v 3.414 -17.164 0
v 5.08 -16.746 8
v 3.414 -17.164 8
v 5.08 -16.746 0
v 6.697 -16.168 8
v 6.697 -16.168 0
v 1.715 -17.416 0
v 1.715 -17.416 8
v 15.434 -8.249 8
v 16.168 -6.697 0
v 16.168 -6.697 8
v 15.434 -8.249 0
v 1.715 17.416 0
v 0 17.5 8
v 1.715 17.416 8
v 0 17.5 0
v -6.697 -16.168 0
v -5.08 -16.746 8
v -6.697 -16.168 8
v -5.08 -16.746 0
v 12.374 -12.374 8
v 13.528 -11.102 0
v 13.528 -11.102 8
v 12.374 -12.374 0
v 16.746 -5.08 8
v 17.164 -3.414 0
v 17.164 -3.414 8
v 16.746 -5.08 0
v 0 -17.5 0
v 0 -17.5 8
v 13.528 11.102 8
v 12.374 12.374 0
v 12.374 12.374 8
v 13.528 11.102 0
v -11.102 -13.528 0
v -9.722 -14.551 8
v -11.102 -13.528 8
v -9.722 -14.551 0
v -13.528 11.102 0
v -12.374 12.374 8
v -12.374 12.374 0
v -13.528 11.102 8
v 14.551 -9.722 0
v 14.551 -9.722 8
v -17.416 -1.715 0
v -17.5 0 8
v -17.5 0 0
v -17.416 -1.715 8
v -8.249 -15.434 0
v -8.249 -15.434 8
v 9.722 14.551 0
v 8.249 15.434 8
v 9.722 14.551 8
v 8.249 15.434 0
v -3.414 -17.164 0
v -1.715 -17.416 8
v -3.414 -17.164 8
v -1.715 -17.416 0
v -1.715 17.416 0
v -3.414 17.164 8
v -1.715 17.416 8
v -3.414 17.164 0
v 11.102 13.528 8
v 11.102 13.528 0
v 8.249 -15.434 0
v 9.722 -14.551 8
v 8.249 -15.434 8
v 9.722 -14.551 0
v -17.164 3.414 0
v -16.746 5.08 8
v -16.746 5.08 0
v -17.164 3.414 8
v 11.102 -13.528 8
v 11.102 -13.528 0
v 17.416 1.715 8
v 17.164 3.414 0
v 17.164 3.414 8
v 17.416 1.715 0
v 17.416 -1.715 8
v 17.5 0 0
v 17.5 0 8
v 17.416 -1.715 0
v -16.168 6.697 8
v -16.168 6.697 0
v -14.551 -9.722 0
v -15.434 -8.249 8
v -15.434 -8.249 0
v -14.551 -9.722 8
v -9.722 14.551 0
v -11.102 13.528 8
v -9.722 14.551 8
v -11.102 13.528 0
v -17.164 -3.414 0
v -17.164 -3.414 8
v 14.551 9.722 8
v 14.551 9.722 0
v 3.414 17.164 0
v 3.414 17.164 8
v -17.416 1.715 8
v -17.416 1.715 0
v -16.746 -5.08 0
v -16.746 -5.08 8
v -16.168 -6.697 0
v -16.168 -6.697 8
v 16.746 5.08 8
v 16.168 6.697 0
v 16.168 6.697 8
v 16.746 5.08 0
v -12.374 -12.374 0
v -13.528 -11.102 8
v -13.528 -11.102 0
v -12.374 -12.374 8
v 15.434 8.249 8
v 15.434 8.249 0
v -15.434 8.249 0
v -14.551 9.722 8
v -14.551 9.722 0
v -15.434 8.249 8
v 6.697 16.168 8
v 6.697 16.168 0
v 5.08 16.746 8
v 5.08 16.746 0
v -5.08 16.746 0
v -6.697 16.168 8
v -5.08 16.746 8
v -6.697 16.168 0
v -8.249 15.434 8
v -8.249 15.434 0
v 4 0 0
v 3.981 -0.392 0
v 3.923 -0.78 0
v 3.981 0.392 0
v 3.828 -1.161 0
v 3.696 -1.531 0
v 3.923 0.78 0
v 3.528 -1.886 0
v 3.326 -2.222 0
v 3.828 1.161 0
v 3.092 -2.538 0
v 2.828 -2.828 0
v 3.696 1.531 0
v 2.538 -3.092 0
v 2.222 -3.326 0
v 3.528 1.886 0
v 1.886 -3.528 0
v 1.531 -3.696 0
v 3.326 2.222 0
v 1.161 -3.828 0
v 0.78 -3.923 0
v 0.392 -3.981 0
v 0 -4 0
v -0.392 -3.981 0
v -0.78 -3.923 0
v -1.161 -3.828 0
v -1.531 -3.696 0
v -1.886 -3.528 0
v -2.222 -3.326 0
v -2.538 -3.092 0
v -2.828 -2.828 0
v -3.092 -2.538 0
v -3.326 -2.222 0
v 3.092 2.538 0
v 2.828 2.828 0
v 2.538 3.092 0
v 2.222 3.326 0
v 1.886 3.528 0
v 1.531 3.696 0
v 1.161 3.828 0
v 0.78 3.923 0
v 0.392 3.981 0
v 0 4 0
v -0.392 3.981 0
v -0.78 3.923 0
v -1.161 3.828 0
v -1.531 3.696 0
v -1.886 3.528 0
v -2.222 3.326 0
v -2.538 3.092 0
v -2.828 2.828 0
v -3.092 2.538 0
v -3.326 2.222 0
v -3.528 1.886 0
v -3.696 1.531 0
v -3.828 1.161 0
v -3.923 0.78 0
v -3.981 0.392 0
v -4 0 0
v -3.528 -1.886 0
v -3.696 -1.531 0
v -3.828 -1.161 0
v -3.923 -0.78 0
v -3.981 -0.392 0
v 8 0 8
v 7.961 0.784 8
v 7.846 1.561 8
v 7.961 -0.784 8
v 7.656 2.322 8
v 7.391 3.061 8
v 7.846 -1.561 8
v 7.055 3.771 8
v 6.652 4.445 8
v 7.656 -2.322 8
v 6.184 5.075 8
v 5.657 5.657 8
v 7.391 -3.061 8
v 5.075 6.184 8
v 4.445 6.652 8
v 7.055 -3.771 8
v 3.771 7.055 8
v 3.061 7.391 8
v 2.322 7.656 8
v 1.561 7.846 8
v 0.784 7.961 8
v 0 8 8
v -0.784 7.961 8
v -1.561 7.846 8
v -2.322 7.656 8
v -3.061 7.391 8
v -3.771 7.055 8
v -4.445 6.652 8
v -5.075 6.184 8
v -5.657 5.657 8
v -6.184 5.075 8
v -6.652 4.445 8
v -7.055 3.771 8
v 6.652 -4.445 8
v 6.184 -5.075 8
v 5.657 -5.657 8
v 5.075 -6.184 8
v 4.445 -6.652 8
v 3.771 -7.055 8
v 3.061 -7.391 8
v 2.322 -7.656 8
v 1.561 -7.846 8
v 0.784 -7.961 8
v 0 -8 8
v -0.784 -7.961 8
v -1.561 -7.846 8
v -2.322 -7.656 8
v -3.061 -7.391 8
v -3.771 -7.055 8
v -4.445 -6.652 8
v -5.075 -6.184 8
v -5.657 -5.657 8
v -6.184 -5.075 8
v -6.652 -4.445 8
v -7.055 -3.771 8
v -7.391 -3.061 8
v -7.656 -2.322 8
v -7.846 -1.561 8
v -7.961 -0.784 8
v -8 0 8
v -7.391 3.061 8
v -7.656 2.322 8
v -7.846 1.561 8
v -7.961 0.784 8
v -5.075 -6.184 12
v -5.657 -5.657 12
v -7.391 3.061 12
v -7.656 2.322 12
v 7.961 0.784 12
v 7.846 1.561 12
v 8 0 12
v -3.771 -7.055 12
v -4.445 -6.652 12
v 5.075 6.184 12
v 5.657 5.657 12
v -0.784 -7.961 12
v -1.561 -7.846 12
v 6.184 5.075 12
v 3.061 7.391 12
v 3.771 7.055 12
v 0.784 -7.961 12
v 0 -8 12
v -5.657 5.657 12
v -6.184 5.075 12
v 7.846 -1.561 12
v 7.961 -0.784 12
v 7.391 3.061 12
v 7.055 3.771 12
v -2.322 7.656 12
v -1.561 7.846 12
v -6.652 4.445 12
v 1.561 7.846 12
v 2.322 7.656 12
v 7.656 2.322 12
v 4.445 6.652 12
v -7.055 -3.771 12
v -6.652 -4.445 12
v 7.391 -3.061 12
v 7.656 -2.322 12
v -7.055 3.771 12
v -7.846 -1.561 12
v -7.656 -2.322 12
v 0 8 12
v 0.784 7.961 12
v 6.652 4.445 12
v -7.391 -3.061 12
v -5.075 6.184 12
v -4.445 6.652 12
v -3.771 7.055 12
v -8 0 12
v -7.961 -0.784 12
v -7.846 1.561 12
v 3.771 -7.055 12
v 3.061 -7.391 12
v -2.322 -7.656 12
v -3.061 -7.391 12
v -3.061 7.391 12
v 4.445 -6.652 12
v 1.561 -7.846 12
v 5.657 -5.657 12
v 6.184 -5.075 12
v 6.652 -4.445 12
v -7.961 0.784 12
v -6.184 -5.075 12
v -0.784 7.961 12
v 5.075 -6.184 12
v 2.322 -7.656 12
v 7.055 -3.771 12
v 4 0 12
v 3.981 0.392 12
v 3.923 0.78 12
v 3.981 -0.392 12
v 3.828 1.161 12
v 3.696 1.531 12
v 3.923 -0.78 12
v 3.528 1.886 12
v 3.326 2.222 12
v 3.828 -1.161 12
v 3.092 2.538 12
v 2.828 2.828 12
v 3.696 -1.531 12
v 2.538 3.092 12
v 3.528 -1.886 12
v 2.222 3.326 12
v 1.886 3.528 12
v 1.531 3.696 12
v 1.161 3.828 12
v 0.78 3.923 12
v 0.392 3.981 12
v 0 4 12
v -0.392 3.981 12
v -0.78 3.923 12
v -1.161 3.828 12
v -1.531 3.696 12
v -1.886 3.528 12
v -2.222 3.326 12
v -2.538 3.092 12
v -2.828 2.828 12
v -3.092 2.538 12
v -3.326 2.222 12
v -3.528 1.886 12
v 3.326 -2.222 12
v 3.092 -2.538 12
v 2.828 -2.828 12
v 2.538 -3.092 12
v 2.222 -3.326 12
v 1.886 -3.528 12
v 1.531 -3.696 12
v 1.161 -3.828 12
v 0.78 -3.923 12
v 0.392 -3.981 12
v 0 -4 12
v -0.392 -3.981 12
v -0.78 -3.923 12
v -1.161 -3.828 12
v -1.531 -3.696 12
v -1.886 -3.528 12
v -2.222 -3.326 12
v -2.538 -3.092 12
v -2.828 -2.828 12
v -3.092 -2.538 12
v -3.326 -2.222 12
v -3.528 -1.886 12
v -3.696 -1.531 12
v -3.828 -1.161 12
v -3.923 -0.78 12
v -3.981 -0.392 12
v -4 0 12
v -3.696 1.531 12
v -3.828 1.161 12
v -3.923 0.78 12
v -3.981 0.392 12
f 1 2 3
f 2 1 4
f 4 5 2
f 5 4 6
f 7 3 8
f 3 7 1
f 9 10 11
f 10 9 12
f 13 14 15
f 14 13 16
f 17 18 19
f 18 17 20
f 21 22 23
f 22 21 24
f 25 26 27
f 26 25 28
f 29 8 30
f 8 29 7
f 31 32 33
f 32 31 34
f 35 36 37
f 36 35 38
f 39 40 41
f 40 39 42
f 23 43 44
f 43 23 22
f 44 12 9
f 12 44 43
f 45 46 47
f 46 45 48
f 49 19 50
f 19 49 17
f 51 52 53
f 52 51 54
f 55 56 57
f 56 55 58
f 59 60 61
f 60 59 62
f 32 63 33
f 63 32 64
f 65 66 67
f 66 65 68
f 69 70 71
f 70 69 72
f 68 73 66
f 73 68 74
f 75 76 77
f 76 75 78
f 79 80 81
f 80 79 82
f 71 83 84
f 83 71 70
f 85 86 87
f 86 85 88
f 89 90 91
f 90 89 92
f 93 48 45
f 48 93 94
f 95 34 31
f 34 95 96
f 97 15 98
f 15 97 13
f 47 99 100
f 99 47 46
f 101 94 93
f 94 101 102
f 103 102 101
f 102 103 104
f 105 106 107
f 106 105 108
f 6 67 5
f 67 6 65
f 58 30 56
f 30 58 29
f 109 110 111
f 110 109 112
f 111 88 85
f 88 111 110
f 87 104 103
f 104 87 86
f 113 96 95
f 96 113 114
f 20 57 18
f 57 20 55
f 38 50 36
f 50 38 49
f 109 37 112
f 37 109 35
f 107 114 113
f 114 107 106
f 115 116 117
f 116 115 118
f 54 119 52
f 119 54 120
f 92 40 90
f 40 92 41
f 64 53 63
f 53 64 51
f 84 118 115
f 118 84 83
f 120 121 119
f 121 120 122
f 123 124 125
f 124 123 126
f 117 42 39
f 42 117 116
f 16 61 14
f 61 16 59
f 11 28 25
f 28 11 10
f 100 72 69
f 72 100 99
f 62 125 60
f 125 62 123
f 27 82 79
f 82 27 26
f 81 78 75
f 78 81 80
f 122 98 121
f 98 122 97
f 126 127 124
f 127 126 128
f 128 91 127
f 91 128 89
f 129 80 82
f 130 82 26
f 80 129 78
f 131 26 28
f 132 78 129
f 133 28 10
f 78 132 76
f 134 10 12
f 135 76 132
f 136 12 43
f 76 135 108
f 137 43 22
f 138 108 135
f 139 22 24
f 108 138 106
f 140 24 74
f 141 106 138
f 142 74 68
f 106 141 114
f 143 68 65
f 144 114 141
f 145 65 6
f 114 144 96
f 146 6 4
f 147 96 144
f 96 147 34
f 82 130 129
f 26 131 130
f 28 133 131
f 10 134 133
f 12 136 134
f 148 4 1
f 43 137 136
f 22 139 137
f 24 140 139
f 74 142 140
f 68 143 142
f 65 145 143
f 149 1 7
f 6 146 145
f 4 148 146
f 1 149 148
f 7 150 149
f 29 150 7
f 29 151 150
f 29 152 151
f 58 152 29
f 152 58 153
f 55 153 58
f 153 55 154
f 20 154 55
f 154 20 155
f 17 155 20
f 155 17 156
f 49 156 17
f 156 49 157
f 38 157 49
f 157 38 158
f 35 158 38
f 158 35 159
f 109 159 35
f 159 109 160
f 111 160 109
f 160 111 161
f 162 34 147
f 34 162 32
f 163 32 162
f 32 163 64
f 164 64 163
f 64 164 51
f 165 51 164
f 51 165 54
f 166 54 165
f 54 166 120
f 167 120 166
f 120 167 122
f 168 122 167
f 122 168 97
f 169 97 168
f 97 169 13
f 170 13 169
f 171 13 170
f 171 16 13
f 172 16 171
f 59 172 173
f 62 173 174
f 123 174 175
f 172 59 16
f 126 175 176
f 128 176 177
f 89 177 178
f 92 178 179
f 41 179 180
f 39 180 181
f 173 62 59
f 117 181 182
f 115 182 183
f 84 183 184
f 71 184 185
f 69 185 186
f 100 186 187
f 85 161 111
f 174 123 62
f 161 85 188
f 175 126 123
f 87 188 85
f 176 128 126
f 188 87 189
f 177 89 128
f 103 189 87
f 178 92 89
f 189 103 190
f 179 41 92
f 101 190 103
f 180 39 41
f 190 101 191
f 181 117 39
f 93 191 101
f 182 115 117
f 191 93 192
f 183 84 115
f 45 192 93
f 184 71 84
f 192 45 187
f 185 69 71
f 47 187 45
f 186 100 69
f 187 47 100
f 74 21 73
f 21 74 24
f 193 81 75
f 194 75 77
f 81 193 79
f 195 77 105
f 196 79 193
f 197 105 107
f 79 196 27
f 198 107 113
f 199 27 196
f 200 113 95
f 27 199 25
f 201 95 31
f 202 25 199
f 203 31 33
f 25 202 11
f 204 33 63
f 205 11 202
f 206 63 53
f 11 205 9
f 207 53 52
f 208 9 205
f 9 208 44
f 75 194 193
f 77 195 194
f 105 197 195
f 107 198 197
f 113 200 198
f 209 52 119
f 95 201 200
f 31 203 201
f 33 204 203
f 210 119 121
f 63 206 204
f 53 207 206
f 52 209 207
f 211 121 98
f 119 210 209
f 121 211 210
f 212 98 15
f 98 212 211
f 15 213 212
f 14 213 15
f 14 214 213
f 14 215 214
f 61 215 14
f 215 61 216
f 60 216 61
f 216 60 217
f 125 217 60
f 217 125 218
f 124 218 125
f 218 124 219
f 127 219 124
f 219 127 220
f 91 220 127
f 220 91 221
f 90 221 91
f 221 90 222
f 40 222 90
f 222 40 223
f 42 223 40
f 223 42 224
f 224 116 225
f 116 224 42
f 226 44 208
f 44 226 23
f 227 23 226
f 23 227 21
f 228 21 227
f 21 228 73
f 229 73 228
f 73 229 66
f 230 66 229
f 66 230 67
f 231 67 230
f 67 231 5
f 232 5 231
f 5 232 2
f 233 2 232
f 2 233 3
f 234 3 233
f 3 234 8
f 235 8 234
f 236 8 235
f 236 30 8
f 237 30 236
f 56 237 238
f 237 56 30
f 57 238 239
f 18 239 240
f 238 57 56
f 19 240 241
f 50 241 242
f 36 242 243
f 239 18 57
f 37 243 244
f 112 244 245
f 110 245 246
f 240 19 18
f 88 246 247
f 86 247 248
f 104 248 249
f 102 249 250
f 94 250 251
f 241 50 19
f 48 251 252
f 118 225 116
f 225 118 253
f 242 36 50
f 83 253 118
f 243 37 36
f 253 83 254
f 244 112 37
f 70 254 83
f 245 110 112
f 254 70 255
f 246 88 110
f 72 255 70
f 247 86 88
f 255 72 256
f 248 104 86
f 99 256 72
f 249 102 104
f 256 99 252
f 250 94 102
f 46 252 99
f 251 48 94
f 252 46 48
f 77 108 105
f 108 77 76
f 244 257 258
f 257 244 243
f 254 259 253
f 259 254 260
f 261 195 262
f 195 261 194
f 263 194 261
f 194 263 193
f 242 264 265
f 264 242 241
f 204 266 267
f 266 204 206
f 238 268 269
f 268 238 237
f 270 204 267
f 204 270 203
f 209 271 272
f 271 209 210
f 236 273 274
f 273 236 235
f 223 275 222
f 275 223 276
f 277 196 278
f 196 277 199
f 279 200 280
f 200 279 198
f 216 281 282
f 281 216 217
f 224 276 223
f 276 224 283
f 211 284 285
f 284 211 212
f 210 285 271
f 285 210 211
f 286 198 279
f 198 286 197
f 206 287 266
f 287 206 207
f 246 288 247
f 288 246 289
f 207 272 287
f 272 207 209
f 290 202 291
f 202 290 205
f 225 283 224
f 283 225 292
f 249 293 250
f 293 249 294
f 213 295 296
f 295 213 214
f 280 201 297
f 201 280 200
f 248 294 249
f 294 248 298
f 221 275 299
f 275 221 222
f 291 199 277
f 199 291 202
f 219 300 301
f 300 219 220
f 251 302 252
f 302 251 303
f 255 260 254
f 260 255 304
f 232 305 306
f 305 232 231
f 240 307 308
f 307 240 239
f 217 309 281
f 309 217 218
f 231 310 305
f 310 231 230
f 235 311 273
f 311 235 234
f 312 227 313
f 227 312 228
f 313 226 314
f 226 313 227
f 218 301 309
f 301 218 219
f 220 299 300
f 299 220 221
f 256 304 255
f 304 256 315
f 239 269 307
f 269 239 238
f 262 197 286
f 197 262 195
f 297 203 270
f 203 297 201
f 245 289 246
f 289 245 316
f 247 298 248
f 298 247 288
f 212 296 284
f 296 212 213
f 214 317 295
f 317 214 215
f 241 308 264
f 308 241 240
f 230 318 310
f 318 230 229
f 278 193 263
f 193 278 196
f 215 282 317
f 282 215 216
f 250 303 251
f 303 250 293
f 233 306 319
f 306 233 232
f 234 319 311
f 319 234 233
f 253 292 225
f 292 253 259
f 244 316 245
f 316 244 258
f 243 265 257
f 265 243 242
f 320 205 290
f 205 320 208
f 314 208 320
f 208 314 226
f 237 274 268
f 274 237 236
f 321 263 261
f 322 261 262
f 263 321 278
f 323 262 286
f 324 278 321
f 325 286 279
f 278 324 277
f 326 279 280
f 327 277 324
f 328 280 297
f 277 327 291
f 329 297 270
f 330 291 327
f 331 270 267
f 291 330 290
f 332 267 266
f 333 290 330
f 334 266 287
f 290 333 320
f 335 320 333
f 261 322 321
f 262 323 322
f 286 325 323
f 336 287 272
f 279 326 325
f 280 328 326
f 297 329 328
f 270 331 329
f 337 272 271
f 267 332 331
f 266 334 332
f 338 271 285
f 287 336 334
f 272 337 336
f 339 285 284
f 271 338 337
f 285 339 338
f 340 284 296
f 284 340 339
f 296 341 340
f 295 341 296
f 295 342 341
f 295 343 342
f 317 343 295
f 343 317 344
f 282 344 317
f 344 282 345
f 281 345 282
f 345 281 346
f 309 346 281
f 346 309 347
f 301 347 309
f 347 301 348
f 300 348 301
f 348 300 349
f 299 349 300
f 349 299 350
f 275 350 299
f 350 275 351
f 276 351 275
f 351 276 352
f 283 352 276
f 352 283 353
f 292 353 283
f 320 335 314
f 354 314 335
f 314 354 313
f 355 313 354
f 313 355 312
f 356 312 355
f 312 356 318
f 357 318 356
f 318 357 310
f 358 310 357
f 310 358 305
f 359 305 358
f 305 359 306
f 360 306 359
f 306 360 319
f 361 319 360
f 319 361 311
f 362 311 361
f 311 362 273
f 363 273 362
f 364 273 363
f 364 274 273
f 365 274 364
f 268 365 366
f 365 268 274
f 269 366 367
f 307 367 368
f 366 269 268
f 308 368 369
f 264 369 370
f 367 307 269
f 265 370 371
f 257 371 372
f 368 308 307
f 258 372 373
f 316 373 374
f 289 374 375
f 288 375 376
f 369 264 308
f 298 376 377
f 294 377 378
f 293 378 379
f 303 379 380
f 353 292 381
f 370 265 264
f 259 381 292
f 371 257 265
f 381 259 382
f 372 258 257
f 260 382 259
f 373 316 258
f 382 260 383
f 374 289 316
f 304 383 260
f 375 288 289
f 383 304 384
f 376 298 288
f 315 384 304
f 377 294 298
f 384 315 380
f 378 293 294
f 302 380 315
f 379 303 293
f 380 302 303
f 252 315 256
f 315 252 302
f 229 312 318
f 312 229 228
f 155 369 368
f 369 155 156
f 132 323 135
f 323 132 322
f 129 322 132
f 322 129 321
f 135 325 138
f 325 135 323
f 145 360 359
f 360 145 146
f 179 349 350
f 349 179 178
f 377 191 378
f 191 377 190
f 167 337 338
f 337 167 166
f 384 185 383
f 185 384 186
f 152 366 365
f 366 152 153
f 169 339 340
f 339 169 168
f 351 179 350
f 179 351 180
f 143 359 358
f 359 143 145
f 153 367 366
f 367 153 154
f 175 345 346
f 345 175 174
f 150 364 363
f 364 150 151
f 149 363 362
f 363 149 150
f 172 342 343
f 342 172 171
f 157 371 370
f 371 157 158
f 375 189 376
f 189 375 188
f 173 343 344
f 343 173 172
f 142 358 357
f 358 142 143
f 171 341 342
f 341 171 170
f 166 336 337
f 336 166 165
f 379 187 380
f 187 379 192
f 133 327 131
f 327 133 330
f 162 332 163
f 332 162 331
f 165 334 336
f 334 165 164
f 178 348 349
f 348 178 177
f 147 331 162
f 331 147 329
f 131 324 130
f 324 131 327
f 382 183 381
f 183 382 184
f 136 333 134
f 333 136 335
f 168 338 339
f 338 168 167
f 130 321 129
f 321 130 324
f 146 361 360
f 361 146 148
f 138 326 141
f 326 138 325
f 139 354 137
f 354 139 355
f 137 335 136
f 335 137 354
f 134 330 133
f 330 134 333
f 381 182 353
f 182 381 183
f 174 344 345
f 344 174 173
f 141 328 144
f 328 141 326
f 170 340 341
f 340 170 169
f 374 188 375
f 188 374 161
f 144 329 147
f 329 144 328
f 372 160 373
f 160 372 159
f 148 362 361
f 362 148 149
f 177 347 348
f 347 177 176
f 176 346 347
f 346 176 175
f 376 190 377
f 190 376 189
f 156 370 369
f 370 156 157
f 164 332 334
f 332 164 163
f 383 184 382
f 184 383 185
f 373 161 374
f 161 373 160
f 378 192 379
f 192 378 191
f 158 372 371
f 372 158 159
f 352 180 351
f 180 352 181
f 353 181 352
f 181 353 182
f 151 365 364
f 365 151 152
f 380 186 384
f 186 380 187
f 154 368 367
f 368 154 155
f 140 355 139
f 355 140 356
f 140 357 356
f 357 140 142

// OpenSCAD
// Spur gear — demonstrates trigonometry and polygon/linear_extrude
// Involute tooth approximation

$fn = 64;

module_size = 2;       // gear module (tooth size)
num_teeth = 20;
pressure_angle = 20;   // degrees
gear_thickness = 8;
bore_diameter = 8;
hub_diameter = 16;
hub_height = 4;

module gear_2d(m, teeth, pa) {
    pitch_r = m * teeth / 2;
    addendum = m;
    dedendum = m * 1.25;
    outer_r = pitch_r + addendum;
    root_r = pitch_r - dedendum;
    base_r = pitch_r * cos(pa);
    tooth_angle = 360 / teeth;

    // Approximate involute tooth profile using polygon
    function involute_point(r, base_r) =
        let(angle = acos(base_r / r))
        let(roll = sqrt(r * r - base_r * base_r) / base_r)
        let(inv_angle = roll * 180 / PI - angle)
        [r * cos(inv_angle), r * sin(inv_angle)];

    difference() {
        union() {
            for (i = [0 : teeth - 1]) {
                rotate([0, 0, i * tooth_angle])
                    polygon([
                        [0, 0],
                        for (r = [root_r : 0.5 : outer_r])
                            let(a = acos(min(1, base_r / r)))
                            let(roll_a = (sqrt(r*r - base_r*base_r) / base_r) * 180 / PI - a)
                            [r * cos(roll_a + tooth_angle/4),
                             r * sin(roll_a + tooth_angle/4)],
                        for (r = [outer_r : -0.5 : root_r])
                            let(a = acos(min(1, base_r / r)))
                            let(roll_a = (sqrt(r*r - base_r*base_r) / base_r) * 180 / PI - a)
                            [r * cos(-roll_a + tooth_angle/4),
                             r * sin(-roll_a + tooth_angle/4)],
                    ]);
            }
        }
        // Root circle cleanup
        circle(r=root_r - 0.1);
    }

    // Root disk
    circle(r=root_r);
}

module gear(m, teeth, pa, thickness, bore_d, hub_d, hub_h) {
    difference() {
        union() {
            // Gear body
            linear_extrude(thickness)
                gear_2d(m, teeth, pa);

            // Hub
            cylinder(h=thickness + hub_h, d=hub_d);
        }

        // Bore hole
        translate([0, 0, -0.5])
            cylinder(h=thickness + hub_h + 1, d=bore_d);
    }
}

gear(
    m = module_size,
    teeth = num_teeth,
    pa = pressure_angle,
    thickness = gear_thickness,
    bore_d = bore_diameter,
    hub_d = hub_diameter,
    hub_h = hub_height
);
